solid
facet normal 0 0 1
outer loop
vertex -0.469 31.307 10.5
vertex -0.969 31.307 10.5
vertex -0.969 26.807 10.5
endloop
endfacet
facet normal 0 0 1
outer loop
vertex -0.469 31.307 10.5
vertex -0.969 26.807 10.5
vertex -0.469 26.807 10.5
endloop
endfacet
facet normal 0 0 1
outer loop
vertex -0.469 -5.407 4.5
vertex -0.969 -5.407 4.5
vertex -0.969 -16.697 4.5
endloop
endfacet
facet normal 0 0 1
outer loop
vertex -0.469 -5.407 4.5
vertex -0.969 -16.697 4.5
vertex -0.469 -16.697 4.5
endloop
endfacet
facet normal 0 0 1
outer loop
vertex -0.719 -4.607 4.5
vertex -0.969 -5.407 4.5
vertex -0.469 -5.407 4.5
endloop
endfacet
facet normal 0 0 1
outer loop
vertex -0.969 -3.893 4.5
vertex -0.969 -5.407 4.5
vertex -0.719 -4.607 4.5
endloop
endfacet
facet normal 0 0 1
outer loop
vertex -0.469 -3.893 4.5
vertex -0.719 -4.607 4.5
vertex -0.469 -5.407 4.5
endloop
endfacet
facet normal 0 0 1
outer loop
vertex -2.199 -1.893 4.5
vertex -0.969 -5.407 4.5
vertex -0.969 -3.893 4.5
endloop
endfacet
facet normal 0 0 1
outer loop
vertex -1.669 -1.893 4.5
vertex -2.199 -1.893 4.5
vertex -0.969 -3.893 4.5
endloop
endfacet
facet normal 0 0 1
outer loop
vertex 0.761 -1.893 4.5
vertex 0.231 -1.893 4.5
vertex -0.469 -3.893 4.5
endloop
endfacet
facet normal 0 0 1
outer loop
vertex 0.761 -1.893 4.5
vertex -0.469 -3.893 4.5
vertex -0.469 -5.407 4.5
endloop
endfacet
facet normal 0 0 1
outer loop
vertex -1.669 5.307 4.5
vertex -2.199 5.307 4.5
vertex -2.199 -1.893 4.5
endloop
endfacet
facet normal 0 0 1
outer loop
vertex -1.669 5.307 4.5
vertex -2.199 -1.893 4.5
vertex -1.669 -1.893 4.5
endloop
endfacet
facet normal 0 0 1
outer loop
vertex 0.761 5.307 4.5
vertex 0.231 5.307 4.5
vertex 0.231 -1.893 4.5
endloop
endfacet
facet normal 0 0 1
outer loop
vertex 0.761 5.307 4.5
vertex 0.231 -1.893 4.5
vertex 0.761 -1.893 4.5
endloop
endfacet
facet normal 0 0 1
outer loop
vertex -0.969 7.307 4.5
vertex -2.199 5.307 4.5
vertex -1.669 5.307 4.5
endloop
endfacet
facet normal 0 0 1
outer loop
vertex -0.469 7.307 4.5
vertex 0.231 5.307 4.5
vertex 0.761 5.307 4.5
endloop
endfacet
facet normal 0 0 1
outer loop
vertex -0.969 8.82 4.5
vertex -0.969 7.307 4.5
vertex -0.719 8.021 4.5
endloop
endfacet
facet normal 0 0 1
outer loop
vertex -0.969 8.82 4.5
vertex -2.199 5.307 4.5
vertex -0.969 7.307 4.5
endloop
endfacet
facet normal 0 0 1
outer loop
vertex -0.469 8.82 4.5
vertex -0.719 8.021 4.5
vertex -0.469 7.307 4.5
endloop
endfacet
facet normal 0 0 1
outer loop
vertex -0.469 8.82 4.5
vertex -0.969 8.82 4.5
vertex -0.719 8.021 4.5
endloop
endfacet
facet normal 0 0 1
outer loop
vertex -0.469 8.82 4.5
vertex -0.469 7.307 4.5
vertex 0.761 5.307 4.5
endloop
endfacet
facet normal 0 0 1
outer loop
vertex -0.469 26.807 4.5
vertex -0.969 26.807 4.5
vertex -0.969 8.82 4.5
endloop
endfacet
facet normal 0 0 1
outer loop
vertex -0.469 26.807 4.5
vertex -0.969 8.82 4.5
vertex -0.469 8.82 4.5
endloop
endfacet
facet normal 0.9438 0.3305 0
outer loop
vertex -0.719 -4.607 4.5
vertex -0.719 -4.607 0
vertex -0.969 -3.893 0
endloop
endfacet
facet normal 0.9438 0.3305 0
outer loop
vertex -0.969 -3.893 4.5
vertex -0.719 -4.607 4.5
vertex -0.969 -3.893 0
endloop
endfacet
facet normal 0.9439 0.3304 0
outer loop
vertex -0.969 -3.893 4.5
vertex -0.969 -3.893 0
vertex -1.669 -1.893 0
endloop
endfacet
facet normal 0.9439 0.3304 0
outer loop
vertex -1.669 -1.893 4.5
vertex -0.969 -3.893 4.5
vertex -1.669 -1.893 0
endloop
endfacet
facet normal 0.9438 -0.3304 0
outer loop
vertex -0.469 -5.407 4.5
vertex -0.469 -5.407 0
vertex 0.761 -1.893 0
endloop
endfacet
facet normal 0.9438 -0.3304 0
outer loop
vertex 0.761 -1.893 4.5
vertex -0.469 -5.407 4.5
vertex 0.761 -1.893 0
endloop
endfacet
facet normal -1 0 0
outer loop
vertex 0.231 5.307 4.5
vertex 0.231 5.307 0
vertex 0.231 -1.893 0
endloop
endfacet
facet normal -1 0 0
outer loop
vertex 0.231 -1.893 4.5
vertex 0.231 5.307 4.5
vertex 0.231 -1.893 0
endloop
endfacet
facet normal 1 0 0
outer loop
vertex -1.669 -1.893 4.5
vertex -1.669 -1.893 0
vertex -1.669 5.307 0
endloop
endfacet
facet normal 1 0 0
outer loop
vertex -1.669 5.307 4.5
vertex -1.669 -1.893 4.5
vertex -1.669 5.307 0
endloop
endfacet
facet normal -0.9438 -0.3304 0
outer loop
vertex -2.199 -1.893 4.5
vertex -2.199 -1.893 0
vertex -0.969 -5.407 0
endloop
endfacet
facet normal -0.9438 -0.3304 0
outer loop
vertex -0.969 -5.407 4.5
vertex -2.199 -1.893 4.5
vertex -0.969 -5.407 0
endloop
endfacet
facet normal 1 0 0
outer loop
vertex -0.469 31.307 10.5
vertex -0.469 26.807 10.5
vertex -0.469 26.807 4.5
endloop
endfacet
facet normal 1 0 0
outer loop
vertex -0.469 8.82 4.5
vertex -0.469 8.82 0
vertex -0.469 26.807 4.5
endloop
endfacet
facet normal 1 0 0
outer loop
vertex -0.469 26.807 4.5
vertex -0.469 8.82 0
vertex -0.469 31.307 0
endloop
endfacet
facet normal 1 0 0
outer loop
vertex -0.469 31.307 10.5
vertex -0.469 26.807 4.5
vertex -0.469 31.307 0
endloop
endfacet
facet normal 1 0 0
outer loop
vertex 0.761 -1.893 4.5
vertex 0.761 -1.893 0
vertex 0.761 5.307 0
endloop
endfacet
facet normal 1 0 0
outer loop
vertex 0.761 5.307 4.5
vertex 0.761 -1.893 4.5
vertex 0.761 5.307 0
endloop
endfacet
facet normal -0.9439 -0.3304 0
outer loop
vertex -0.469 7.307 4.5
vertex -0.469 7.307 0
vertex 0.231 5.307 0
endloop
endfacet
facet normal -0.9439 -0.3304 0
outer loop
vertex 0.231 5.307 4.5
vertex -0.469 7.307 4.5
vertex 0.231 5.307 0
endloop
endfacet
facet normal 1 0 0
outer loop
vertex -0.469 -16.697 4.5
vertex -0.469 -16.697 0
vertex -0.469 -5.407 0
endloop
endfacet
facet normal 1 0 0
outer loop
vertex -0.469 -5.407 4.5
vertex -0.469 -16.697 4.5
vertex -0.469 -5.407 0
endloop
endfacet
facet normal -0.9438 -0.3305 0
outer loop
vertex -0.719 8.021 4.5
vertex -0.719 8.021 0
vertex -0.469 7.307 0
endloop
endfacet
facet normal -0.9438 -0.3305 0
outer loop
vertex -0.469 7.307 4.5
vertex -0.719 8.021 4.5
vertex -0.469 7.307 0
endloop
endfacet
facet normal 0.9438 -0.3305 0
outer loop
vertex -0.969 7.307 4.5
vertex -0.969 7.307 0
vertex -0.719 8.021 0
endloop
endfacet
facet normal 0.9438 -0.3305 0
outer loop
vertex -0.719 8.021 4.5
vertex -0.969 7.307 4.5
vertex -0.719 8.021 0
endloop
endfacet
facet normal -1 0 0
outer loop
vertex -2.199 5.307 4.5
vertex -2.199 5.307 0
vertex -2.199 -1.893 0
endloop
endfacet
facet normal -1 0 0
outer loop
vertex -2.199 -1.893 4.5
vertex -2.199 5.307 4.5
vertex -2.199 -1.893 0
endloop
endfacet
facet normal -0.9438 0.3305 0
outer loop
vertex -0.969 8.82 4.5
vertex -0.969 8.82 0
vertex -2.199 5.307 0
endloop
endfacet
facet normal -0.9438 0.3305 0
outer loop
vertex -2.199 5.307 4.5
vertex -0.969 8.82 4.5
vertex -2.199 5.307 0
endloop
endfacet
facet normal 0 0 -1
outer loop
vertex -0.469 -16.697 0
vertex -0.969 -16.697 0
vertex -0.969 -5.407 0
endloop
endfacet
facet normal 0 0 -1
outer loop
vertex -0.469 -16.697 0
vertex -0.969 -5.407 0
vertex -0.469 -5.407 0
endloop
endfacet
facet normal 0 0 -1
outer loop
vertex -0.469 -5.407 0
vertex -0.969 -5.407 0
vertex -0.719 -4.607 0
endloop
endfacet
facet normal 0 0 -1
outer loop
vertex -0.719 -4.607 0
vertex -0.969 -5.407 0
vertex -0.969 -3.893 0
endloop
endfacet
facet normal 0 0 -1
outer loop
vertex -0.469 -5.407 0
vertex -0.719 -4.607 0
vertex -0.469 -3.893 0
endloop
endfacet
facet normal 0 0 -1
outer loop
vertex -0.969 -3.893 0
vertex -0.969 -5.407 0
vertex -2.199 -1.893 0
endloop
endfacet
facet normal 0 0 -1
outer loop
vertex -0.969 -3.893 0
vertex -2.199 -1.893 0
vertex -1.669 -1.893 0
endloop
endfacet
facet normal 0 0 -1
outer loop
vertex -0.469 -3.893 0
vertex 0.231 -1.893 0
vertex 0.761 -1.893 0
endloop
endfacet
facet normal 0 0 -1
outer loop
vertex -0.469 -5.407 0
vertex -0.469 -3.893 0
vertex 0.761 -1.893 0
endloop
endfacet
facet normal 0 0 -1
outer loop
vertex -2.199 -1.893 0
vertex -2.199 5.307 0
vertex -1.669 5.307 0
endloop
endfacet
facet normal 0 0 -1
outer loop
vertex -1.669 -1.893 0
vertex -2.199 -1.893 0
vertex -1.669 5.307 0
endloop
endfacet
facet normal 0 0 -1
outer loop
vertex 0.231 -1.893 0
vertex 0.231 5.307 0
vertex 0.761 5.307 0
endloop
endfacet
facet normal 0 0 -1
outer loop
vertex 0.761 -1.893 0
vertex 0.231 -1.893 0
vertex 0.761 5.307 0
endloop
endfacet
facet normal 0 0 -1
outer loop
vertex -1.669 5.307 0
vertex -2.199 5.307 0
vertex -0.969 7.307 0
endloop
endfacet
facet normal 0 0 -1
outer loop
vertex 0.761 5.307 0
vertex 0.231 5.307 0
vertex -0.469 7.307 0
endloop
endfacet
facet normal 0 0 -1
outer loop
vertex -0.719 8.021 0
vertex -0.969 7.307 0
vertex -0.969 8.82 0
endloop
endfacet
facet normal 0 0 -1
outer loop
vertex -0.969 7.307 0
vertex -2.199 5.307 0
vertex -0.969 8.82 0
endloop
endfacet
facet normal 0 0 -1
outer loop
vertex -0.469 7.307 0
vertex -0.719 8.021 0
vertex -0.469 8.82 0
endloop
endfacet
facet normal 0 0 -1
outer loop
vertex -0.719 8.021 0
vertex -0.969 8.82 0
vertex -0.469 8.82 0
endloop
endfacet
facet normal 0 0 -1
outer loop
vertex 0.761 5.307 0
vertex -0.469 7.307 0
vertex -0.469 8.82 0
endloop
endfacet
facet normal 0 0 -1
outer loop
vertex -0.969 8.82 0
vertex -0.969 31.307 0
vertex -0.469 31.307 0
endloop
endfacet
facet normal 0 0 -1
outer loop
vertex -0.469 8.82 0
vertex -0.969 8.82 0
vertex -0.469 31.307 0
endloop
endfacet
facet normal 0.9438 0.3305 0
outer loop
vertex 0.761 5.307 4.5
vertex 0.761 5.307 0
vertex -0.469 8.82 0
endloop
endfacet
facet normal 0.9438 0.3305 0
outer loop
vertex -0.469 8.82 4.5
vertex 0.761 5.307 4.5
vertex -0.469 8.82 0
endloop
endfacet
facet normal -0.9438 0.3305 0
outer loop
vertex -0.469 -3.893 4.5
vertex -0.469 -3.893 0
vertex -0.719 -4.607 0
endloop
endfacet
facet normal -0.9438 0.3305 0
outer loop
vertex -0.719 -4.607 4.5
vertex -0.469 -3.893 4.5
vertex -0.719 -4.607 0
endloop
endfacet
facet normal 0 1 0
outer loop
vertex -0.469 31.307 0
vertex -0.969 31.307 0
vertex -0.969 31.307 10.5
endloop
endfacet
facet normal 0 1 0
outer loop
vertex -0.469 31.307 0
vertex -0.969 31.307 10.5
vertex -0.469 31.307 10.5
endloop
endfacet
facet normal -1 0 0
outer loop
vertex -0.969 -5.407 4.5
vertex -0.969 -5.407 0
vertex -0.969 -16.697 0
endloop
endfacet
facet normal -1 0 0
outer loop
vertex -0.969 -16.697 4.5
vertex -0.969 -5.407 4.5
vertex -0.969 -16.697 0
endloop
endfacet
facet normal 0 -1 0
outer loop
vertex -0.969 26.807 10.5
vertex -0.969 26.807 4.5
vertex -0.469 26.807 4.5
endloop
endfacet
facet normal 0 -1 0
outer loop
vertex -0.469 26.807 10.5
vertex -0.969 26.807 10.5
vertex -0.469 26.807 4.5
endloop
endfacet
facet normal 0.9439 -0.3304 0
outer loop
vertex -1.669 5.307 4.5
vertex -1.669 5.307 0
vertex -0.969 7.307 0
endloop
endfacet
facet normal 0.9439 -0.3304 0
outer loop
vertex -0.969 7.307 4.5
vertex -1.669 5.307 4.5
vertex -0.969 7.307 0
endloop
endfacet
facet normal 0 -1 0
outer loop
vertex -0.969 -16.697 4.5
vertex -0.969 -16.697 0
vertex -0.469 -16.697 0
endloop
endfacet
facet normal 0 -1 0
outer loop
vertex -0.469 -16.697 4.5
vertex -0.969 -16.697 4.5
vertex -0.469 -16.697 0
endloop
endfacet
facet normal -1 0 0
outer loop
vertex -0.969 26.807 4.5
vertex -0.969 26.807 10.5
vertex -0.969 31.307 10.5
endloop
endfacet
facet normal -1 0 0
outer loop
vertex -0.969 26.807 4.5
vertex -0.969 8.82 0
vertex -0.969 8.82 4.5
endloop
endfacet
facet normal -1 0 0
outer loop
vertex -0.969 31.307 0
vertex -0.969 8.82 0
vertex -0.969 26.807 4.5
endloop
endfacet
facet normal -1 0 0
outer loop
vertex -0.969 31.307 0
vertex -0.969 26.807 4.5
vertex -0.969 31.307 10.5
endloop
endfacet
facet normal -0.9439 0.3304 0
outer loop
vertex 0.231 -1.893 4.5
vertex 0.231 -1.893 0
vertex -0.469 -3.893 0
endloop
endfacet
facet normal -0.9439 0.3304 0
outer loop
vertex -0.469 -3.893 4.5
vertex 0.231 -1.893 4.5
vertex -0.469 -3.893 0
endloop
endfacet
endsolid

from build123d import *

# Parameters (mm, degrees)
F1_DEPTH = 4.5
F2_W     = 0.5
F2_H     = 4.5
F3_DEPTH = 6


with BuildPart() as f1:
    # F0 (on Top) → F1 (new body)
    with BuildSketch(Plane.XY):
        Polygon((-0.469149, 31.306926), (-0.969149, 31.306926), (-0.969149, 8.820471), (-2.198889, 5.306926), (-2.198889, -1.893074), (-0.969149, -5.406618), (-0.969149, -16.696654), (-0.469149, -16.696654), (-0.469149, -5.406618), (0.760592, -1.893074), (0.760592, 5.306926), (-0.469149, 8.820471), align=None)
        Polygon((-1.669149, -1.893074), (-1.669149, 5.306926), (-0.969149, 7.306926), (-0.719149, 8.021212), (-0.469149, 7.306926), (0.230851, 5.306926), (0.230851, -1.893074), (-0.469149, -3.893074), (-0.719149, -4.607359), (-0.969149, -3.893074), align=None, mode=Mode.SUBTRACT)
    extrude(amount=F1_DEPTH)

    # F2 (on face) → F3 (join)
    with BuildSketch(Plane.XY.offset(4.5)):
        with Locations((-0.719149, 29.056926)):
            Rectangle(F2_W, F2_H)
    extrude(amount=F3_DEPTH)


solid = f1.part
